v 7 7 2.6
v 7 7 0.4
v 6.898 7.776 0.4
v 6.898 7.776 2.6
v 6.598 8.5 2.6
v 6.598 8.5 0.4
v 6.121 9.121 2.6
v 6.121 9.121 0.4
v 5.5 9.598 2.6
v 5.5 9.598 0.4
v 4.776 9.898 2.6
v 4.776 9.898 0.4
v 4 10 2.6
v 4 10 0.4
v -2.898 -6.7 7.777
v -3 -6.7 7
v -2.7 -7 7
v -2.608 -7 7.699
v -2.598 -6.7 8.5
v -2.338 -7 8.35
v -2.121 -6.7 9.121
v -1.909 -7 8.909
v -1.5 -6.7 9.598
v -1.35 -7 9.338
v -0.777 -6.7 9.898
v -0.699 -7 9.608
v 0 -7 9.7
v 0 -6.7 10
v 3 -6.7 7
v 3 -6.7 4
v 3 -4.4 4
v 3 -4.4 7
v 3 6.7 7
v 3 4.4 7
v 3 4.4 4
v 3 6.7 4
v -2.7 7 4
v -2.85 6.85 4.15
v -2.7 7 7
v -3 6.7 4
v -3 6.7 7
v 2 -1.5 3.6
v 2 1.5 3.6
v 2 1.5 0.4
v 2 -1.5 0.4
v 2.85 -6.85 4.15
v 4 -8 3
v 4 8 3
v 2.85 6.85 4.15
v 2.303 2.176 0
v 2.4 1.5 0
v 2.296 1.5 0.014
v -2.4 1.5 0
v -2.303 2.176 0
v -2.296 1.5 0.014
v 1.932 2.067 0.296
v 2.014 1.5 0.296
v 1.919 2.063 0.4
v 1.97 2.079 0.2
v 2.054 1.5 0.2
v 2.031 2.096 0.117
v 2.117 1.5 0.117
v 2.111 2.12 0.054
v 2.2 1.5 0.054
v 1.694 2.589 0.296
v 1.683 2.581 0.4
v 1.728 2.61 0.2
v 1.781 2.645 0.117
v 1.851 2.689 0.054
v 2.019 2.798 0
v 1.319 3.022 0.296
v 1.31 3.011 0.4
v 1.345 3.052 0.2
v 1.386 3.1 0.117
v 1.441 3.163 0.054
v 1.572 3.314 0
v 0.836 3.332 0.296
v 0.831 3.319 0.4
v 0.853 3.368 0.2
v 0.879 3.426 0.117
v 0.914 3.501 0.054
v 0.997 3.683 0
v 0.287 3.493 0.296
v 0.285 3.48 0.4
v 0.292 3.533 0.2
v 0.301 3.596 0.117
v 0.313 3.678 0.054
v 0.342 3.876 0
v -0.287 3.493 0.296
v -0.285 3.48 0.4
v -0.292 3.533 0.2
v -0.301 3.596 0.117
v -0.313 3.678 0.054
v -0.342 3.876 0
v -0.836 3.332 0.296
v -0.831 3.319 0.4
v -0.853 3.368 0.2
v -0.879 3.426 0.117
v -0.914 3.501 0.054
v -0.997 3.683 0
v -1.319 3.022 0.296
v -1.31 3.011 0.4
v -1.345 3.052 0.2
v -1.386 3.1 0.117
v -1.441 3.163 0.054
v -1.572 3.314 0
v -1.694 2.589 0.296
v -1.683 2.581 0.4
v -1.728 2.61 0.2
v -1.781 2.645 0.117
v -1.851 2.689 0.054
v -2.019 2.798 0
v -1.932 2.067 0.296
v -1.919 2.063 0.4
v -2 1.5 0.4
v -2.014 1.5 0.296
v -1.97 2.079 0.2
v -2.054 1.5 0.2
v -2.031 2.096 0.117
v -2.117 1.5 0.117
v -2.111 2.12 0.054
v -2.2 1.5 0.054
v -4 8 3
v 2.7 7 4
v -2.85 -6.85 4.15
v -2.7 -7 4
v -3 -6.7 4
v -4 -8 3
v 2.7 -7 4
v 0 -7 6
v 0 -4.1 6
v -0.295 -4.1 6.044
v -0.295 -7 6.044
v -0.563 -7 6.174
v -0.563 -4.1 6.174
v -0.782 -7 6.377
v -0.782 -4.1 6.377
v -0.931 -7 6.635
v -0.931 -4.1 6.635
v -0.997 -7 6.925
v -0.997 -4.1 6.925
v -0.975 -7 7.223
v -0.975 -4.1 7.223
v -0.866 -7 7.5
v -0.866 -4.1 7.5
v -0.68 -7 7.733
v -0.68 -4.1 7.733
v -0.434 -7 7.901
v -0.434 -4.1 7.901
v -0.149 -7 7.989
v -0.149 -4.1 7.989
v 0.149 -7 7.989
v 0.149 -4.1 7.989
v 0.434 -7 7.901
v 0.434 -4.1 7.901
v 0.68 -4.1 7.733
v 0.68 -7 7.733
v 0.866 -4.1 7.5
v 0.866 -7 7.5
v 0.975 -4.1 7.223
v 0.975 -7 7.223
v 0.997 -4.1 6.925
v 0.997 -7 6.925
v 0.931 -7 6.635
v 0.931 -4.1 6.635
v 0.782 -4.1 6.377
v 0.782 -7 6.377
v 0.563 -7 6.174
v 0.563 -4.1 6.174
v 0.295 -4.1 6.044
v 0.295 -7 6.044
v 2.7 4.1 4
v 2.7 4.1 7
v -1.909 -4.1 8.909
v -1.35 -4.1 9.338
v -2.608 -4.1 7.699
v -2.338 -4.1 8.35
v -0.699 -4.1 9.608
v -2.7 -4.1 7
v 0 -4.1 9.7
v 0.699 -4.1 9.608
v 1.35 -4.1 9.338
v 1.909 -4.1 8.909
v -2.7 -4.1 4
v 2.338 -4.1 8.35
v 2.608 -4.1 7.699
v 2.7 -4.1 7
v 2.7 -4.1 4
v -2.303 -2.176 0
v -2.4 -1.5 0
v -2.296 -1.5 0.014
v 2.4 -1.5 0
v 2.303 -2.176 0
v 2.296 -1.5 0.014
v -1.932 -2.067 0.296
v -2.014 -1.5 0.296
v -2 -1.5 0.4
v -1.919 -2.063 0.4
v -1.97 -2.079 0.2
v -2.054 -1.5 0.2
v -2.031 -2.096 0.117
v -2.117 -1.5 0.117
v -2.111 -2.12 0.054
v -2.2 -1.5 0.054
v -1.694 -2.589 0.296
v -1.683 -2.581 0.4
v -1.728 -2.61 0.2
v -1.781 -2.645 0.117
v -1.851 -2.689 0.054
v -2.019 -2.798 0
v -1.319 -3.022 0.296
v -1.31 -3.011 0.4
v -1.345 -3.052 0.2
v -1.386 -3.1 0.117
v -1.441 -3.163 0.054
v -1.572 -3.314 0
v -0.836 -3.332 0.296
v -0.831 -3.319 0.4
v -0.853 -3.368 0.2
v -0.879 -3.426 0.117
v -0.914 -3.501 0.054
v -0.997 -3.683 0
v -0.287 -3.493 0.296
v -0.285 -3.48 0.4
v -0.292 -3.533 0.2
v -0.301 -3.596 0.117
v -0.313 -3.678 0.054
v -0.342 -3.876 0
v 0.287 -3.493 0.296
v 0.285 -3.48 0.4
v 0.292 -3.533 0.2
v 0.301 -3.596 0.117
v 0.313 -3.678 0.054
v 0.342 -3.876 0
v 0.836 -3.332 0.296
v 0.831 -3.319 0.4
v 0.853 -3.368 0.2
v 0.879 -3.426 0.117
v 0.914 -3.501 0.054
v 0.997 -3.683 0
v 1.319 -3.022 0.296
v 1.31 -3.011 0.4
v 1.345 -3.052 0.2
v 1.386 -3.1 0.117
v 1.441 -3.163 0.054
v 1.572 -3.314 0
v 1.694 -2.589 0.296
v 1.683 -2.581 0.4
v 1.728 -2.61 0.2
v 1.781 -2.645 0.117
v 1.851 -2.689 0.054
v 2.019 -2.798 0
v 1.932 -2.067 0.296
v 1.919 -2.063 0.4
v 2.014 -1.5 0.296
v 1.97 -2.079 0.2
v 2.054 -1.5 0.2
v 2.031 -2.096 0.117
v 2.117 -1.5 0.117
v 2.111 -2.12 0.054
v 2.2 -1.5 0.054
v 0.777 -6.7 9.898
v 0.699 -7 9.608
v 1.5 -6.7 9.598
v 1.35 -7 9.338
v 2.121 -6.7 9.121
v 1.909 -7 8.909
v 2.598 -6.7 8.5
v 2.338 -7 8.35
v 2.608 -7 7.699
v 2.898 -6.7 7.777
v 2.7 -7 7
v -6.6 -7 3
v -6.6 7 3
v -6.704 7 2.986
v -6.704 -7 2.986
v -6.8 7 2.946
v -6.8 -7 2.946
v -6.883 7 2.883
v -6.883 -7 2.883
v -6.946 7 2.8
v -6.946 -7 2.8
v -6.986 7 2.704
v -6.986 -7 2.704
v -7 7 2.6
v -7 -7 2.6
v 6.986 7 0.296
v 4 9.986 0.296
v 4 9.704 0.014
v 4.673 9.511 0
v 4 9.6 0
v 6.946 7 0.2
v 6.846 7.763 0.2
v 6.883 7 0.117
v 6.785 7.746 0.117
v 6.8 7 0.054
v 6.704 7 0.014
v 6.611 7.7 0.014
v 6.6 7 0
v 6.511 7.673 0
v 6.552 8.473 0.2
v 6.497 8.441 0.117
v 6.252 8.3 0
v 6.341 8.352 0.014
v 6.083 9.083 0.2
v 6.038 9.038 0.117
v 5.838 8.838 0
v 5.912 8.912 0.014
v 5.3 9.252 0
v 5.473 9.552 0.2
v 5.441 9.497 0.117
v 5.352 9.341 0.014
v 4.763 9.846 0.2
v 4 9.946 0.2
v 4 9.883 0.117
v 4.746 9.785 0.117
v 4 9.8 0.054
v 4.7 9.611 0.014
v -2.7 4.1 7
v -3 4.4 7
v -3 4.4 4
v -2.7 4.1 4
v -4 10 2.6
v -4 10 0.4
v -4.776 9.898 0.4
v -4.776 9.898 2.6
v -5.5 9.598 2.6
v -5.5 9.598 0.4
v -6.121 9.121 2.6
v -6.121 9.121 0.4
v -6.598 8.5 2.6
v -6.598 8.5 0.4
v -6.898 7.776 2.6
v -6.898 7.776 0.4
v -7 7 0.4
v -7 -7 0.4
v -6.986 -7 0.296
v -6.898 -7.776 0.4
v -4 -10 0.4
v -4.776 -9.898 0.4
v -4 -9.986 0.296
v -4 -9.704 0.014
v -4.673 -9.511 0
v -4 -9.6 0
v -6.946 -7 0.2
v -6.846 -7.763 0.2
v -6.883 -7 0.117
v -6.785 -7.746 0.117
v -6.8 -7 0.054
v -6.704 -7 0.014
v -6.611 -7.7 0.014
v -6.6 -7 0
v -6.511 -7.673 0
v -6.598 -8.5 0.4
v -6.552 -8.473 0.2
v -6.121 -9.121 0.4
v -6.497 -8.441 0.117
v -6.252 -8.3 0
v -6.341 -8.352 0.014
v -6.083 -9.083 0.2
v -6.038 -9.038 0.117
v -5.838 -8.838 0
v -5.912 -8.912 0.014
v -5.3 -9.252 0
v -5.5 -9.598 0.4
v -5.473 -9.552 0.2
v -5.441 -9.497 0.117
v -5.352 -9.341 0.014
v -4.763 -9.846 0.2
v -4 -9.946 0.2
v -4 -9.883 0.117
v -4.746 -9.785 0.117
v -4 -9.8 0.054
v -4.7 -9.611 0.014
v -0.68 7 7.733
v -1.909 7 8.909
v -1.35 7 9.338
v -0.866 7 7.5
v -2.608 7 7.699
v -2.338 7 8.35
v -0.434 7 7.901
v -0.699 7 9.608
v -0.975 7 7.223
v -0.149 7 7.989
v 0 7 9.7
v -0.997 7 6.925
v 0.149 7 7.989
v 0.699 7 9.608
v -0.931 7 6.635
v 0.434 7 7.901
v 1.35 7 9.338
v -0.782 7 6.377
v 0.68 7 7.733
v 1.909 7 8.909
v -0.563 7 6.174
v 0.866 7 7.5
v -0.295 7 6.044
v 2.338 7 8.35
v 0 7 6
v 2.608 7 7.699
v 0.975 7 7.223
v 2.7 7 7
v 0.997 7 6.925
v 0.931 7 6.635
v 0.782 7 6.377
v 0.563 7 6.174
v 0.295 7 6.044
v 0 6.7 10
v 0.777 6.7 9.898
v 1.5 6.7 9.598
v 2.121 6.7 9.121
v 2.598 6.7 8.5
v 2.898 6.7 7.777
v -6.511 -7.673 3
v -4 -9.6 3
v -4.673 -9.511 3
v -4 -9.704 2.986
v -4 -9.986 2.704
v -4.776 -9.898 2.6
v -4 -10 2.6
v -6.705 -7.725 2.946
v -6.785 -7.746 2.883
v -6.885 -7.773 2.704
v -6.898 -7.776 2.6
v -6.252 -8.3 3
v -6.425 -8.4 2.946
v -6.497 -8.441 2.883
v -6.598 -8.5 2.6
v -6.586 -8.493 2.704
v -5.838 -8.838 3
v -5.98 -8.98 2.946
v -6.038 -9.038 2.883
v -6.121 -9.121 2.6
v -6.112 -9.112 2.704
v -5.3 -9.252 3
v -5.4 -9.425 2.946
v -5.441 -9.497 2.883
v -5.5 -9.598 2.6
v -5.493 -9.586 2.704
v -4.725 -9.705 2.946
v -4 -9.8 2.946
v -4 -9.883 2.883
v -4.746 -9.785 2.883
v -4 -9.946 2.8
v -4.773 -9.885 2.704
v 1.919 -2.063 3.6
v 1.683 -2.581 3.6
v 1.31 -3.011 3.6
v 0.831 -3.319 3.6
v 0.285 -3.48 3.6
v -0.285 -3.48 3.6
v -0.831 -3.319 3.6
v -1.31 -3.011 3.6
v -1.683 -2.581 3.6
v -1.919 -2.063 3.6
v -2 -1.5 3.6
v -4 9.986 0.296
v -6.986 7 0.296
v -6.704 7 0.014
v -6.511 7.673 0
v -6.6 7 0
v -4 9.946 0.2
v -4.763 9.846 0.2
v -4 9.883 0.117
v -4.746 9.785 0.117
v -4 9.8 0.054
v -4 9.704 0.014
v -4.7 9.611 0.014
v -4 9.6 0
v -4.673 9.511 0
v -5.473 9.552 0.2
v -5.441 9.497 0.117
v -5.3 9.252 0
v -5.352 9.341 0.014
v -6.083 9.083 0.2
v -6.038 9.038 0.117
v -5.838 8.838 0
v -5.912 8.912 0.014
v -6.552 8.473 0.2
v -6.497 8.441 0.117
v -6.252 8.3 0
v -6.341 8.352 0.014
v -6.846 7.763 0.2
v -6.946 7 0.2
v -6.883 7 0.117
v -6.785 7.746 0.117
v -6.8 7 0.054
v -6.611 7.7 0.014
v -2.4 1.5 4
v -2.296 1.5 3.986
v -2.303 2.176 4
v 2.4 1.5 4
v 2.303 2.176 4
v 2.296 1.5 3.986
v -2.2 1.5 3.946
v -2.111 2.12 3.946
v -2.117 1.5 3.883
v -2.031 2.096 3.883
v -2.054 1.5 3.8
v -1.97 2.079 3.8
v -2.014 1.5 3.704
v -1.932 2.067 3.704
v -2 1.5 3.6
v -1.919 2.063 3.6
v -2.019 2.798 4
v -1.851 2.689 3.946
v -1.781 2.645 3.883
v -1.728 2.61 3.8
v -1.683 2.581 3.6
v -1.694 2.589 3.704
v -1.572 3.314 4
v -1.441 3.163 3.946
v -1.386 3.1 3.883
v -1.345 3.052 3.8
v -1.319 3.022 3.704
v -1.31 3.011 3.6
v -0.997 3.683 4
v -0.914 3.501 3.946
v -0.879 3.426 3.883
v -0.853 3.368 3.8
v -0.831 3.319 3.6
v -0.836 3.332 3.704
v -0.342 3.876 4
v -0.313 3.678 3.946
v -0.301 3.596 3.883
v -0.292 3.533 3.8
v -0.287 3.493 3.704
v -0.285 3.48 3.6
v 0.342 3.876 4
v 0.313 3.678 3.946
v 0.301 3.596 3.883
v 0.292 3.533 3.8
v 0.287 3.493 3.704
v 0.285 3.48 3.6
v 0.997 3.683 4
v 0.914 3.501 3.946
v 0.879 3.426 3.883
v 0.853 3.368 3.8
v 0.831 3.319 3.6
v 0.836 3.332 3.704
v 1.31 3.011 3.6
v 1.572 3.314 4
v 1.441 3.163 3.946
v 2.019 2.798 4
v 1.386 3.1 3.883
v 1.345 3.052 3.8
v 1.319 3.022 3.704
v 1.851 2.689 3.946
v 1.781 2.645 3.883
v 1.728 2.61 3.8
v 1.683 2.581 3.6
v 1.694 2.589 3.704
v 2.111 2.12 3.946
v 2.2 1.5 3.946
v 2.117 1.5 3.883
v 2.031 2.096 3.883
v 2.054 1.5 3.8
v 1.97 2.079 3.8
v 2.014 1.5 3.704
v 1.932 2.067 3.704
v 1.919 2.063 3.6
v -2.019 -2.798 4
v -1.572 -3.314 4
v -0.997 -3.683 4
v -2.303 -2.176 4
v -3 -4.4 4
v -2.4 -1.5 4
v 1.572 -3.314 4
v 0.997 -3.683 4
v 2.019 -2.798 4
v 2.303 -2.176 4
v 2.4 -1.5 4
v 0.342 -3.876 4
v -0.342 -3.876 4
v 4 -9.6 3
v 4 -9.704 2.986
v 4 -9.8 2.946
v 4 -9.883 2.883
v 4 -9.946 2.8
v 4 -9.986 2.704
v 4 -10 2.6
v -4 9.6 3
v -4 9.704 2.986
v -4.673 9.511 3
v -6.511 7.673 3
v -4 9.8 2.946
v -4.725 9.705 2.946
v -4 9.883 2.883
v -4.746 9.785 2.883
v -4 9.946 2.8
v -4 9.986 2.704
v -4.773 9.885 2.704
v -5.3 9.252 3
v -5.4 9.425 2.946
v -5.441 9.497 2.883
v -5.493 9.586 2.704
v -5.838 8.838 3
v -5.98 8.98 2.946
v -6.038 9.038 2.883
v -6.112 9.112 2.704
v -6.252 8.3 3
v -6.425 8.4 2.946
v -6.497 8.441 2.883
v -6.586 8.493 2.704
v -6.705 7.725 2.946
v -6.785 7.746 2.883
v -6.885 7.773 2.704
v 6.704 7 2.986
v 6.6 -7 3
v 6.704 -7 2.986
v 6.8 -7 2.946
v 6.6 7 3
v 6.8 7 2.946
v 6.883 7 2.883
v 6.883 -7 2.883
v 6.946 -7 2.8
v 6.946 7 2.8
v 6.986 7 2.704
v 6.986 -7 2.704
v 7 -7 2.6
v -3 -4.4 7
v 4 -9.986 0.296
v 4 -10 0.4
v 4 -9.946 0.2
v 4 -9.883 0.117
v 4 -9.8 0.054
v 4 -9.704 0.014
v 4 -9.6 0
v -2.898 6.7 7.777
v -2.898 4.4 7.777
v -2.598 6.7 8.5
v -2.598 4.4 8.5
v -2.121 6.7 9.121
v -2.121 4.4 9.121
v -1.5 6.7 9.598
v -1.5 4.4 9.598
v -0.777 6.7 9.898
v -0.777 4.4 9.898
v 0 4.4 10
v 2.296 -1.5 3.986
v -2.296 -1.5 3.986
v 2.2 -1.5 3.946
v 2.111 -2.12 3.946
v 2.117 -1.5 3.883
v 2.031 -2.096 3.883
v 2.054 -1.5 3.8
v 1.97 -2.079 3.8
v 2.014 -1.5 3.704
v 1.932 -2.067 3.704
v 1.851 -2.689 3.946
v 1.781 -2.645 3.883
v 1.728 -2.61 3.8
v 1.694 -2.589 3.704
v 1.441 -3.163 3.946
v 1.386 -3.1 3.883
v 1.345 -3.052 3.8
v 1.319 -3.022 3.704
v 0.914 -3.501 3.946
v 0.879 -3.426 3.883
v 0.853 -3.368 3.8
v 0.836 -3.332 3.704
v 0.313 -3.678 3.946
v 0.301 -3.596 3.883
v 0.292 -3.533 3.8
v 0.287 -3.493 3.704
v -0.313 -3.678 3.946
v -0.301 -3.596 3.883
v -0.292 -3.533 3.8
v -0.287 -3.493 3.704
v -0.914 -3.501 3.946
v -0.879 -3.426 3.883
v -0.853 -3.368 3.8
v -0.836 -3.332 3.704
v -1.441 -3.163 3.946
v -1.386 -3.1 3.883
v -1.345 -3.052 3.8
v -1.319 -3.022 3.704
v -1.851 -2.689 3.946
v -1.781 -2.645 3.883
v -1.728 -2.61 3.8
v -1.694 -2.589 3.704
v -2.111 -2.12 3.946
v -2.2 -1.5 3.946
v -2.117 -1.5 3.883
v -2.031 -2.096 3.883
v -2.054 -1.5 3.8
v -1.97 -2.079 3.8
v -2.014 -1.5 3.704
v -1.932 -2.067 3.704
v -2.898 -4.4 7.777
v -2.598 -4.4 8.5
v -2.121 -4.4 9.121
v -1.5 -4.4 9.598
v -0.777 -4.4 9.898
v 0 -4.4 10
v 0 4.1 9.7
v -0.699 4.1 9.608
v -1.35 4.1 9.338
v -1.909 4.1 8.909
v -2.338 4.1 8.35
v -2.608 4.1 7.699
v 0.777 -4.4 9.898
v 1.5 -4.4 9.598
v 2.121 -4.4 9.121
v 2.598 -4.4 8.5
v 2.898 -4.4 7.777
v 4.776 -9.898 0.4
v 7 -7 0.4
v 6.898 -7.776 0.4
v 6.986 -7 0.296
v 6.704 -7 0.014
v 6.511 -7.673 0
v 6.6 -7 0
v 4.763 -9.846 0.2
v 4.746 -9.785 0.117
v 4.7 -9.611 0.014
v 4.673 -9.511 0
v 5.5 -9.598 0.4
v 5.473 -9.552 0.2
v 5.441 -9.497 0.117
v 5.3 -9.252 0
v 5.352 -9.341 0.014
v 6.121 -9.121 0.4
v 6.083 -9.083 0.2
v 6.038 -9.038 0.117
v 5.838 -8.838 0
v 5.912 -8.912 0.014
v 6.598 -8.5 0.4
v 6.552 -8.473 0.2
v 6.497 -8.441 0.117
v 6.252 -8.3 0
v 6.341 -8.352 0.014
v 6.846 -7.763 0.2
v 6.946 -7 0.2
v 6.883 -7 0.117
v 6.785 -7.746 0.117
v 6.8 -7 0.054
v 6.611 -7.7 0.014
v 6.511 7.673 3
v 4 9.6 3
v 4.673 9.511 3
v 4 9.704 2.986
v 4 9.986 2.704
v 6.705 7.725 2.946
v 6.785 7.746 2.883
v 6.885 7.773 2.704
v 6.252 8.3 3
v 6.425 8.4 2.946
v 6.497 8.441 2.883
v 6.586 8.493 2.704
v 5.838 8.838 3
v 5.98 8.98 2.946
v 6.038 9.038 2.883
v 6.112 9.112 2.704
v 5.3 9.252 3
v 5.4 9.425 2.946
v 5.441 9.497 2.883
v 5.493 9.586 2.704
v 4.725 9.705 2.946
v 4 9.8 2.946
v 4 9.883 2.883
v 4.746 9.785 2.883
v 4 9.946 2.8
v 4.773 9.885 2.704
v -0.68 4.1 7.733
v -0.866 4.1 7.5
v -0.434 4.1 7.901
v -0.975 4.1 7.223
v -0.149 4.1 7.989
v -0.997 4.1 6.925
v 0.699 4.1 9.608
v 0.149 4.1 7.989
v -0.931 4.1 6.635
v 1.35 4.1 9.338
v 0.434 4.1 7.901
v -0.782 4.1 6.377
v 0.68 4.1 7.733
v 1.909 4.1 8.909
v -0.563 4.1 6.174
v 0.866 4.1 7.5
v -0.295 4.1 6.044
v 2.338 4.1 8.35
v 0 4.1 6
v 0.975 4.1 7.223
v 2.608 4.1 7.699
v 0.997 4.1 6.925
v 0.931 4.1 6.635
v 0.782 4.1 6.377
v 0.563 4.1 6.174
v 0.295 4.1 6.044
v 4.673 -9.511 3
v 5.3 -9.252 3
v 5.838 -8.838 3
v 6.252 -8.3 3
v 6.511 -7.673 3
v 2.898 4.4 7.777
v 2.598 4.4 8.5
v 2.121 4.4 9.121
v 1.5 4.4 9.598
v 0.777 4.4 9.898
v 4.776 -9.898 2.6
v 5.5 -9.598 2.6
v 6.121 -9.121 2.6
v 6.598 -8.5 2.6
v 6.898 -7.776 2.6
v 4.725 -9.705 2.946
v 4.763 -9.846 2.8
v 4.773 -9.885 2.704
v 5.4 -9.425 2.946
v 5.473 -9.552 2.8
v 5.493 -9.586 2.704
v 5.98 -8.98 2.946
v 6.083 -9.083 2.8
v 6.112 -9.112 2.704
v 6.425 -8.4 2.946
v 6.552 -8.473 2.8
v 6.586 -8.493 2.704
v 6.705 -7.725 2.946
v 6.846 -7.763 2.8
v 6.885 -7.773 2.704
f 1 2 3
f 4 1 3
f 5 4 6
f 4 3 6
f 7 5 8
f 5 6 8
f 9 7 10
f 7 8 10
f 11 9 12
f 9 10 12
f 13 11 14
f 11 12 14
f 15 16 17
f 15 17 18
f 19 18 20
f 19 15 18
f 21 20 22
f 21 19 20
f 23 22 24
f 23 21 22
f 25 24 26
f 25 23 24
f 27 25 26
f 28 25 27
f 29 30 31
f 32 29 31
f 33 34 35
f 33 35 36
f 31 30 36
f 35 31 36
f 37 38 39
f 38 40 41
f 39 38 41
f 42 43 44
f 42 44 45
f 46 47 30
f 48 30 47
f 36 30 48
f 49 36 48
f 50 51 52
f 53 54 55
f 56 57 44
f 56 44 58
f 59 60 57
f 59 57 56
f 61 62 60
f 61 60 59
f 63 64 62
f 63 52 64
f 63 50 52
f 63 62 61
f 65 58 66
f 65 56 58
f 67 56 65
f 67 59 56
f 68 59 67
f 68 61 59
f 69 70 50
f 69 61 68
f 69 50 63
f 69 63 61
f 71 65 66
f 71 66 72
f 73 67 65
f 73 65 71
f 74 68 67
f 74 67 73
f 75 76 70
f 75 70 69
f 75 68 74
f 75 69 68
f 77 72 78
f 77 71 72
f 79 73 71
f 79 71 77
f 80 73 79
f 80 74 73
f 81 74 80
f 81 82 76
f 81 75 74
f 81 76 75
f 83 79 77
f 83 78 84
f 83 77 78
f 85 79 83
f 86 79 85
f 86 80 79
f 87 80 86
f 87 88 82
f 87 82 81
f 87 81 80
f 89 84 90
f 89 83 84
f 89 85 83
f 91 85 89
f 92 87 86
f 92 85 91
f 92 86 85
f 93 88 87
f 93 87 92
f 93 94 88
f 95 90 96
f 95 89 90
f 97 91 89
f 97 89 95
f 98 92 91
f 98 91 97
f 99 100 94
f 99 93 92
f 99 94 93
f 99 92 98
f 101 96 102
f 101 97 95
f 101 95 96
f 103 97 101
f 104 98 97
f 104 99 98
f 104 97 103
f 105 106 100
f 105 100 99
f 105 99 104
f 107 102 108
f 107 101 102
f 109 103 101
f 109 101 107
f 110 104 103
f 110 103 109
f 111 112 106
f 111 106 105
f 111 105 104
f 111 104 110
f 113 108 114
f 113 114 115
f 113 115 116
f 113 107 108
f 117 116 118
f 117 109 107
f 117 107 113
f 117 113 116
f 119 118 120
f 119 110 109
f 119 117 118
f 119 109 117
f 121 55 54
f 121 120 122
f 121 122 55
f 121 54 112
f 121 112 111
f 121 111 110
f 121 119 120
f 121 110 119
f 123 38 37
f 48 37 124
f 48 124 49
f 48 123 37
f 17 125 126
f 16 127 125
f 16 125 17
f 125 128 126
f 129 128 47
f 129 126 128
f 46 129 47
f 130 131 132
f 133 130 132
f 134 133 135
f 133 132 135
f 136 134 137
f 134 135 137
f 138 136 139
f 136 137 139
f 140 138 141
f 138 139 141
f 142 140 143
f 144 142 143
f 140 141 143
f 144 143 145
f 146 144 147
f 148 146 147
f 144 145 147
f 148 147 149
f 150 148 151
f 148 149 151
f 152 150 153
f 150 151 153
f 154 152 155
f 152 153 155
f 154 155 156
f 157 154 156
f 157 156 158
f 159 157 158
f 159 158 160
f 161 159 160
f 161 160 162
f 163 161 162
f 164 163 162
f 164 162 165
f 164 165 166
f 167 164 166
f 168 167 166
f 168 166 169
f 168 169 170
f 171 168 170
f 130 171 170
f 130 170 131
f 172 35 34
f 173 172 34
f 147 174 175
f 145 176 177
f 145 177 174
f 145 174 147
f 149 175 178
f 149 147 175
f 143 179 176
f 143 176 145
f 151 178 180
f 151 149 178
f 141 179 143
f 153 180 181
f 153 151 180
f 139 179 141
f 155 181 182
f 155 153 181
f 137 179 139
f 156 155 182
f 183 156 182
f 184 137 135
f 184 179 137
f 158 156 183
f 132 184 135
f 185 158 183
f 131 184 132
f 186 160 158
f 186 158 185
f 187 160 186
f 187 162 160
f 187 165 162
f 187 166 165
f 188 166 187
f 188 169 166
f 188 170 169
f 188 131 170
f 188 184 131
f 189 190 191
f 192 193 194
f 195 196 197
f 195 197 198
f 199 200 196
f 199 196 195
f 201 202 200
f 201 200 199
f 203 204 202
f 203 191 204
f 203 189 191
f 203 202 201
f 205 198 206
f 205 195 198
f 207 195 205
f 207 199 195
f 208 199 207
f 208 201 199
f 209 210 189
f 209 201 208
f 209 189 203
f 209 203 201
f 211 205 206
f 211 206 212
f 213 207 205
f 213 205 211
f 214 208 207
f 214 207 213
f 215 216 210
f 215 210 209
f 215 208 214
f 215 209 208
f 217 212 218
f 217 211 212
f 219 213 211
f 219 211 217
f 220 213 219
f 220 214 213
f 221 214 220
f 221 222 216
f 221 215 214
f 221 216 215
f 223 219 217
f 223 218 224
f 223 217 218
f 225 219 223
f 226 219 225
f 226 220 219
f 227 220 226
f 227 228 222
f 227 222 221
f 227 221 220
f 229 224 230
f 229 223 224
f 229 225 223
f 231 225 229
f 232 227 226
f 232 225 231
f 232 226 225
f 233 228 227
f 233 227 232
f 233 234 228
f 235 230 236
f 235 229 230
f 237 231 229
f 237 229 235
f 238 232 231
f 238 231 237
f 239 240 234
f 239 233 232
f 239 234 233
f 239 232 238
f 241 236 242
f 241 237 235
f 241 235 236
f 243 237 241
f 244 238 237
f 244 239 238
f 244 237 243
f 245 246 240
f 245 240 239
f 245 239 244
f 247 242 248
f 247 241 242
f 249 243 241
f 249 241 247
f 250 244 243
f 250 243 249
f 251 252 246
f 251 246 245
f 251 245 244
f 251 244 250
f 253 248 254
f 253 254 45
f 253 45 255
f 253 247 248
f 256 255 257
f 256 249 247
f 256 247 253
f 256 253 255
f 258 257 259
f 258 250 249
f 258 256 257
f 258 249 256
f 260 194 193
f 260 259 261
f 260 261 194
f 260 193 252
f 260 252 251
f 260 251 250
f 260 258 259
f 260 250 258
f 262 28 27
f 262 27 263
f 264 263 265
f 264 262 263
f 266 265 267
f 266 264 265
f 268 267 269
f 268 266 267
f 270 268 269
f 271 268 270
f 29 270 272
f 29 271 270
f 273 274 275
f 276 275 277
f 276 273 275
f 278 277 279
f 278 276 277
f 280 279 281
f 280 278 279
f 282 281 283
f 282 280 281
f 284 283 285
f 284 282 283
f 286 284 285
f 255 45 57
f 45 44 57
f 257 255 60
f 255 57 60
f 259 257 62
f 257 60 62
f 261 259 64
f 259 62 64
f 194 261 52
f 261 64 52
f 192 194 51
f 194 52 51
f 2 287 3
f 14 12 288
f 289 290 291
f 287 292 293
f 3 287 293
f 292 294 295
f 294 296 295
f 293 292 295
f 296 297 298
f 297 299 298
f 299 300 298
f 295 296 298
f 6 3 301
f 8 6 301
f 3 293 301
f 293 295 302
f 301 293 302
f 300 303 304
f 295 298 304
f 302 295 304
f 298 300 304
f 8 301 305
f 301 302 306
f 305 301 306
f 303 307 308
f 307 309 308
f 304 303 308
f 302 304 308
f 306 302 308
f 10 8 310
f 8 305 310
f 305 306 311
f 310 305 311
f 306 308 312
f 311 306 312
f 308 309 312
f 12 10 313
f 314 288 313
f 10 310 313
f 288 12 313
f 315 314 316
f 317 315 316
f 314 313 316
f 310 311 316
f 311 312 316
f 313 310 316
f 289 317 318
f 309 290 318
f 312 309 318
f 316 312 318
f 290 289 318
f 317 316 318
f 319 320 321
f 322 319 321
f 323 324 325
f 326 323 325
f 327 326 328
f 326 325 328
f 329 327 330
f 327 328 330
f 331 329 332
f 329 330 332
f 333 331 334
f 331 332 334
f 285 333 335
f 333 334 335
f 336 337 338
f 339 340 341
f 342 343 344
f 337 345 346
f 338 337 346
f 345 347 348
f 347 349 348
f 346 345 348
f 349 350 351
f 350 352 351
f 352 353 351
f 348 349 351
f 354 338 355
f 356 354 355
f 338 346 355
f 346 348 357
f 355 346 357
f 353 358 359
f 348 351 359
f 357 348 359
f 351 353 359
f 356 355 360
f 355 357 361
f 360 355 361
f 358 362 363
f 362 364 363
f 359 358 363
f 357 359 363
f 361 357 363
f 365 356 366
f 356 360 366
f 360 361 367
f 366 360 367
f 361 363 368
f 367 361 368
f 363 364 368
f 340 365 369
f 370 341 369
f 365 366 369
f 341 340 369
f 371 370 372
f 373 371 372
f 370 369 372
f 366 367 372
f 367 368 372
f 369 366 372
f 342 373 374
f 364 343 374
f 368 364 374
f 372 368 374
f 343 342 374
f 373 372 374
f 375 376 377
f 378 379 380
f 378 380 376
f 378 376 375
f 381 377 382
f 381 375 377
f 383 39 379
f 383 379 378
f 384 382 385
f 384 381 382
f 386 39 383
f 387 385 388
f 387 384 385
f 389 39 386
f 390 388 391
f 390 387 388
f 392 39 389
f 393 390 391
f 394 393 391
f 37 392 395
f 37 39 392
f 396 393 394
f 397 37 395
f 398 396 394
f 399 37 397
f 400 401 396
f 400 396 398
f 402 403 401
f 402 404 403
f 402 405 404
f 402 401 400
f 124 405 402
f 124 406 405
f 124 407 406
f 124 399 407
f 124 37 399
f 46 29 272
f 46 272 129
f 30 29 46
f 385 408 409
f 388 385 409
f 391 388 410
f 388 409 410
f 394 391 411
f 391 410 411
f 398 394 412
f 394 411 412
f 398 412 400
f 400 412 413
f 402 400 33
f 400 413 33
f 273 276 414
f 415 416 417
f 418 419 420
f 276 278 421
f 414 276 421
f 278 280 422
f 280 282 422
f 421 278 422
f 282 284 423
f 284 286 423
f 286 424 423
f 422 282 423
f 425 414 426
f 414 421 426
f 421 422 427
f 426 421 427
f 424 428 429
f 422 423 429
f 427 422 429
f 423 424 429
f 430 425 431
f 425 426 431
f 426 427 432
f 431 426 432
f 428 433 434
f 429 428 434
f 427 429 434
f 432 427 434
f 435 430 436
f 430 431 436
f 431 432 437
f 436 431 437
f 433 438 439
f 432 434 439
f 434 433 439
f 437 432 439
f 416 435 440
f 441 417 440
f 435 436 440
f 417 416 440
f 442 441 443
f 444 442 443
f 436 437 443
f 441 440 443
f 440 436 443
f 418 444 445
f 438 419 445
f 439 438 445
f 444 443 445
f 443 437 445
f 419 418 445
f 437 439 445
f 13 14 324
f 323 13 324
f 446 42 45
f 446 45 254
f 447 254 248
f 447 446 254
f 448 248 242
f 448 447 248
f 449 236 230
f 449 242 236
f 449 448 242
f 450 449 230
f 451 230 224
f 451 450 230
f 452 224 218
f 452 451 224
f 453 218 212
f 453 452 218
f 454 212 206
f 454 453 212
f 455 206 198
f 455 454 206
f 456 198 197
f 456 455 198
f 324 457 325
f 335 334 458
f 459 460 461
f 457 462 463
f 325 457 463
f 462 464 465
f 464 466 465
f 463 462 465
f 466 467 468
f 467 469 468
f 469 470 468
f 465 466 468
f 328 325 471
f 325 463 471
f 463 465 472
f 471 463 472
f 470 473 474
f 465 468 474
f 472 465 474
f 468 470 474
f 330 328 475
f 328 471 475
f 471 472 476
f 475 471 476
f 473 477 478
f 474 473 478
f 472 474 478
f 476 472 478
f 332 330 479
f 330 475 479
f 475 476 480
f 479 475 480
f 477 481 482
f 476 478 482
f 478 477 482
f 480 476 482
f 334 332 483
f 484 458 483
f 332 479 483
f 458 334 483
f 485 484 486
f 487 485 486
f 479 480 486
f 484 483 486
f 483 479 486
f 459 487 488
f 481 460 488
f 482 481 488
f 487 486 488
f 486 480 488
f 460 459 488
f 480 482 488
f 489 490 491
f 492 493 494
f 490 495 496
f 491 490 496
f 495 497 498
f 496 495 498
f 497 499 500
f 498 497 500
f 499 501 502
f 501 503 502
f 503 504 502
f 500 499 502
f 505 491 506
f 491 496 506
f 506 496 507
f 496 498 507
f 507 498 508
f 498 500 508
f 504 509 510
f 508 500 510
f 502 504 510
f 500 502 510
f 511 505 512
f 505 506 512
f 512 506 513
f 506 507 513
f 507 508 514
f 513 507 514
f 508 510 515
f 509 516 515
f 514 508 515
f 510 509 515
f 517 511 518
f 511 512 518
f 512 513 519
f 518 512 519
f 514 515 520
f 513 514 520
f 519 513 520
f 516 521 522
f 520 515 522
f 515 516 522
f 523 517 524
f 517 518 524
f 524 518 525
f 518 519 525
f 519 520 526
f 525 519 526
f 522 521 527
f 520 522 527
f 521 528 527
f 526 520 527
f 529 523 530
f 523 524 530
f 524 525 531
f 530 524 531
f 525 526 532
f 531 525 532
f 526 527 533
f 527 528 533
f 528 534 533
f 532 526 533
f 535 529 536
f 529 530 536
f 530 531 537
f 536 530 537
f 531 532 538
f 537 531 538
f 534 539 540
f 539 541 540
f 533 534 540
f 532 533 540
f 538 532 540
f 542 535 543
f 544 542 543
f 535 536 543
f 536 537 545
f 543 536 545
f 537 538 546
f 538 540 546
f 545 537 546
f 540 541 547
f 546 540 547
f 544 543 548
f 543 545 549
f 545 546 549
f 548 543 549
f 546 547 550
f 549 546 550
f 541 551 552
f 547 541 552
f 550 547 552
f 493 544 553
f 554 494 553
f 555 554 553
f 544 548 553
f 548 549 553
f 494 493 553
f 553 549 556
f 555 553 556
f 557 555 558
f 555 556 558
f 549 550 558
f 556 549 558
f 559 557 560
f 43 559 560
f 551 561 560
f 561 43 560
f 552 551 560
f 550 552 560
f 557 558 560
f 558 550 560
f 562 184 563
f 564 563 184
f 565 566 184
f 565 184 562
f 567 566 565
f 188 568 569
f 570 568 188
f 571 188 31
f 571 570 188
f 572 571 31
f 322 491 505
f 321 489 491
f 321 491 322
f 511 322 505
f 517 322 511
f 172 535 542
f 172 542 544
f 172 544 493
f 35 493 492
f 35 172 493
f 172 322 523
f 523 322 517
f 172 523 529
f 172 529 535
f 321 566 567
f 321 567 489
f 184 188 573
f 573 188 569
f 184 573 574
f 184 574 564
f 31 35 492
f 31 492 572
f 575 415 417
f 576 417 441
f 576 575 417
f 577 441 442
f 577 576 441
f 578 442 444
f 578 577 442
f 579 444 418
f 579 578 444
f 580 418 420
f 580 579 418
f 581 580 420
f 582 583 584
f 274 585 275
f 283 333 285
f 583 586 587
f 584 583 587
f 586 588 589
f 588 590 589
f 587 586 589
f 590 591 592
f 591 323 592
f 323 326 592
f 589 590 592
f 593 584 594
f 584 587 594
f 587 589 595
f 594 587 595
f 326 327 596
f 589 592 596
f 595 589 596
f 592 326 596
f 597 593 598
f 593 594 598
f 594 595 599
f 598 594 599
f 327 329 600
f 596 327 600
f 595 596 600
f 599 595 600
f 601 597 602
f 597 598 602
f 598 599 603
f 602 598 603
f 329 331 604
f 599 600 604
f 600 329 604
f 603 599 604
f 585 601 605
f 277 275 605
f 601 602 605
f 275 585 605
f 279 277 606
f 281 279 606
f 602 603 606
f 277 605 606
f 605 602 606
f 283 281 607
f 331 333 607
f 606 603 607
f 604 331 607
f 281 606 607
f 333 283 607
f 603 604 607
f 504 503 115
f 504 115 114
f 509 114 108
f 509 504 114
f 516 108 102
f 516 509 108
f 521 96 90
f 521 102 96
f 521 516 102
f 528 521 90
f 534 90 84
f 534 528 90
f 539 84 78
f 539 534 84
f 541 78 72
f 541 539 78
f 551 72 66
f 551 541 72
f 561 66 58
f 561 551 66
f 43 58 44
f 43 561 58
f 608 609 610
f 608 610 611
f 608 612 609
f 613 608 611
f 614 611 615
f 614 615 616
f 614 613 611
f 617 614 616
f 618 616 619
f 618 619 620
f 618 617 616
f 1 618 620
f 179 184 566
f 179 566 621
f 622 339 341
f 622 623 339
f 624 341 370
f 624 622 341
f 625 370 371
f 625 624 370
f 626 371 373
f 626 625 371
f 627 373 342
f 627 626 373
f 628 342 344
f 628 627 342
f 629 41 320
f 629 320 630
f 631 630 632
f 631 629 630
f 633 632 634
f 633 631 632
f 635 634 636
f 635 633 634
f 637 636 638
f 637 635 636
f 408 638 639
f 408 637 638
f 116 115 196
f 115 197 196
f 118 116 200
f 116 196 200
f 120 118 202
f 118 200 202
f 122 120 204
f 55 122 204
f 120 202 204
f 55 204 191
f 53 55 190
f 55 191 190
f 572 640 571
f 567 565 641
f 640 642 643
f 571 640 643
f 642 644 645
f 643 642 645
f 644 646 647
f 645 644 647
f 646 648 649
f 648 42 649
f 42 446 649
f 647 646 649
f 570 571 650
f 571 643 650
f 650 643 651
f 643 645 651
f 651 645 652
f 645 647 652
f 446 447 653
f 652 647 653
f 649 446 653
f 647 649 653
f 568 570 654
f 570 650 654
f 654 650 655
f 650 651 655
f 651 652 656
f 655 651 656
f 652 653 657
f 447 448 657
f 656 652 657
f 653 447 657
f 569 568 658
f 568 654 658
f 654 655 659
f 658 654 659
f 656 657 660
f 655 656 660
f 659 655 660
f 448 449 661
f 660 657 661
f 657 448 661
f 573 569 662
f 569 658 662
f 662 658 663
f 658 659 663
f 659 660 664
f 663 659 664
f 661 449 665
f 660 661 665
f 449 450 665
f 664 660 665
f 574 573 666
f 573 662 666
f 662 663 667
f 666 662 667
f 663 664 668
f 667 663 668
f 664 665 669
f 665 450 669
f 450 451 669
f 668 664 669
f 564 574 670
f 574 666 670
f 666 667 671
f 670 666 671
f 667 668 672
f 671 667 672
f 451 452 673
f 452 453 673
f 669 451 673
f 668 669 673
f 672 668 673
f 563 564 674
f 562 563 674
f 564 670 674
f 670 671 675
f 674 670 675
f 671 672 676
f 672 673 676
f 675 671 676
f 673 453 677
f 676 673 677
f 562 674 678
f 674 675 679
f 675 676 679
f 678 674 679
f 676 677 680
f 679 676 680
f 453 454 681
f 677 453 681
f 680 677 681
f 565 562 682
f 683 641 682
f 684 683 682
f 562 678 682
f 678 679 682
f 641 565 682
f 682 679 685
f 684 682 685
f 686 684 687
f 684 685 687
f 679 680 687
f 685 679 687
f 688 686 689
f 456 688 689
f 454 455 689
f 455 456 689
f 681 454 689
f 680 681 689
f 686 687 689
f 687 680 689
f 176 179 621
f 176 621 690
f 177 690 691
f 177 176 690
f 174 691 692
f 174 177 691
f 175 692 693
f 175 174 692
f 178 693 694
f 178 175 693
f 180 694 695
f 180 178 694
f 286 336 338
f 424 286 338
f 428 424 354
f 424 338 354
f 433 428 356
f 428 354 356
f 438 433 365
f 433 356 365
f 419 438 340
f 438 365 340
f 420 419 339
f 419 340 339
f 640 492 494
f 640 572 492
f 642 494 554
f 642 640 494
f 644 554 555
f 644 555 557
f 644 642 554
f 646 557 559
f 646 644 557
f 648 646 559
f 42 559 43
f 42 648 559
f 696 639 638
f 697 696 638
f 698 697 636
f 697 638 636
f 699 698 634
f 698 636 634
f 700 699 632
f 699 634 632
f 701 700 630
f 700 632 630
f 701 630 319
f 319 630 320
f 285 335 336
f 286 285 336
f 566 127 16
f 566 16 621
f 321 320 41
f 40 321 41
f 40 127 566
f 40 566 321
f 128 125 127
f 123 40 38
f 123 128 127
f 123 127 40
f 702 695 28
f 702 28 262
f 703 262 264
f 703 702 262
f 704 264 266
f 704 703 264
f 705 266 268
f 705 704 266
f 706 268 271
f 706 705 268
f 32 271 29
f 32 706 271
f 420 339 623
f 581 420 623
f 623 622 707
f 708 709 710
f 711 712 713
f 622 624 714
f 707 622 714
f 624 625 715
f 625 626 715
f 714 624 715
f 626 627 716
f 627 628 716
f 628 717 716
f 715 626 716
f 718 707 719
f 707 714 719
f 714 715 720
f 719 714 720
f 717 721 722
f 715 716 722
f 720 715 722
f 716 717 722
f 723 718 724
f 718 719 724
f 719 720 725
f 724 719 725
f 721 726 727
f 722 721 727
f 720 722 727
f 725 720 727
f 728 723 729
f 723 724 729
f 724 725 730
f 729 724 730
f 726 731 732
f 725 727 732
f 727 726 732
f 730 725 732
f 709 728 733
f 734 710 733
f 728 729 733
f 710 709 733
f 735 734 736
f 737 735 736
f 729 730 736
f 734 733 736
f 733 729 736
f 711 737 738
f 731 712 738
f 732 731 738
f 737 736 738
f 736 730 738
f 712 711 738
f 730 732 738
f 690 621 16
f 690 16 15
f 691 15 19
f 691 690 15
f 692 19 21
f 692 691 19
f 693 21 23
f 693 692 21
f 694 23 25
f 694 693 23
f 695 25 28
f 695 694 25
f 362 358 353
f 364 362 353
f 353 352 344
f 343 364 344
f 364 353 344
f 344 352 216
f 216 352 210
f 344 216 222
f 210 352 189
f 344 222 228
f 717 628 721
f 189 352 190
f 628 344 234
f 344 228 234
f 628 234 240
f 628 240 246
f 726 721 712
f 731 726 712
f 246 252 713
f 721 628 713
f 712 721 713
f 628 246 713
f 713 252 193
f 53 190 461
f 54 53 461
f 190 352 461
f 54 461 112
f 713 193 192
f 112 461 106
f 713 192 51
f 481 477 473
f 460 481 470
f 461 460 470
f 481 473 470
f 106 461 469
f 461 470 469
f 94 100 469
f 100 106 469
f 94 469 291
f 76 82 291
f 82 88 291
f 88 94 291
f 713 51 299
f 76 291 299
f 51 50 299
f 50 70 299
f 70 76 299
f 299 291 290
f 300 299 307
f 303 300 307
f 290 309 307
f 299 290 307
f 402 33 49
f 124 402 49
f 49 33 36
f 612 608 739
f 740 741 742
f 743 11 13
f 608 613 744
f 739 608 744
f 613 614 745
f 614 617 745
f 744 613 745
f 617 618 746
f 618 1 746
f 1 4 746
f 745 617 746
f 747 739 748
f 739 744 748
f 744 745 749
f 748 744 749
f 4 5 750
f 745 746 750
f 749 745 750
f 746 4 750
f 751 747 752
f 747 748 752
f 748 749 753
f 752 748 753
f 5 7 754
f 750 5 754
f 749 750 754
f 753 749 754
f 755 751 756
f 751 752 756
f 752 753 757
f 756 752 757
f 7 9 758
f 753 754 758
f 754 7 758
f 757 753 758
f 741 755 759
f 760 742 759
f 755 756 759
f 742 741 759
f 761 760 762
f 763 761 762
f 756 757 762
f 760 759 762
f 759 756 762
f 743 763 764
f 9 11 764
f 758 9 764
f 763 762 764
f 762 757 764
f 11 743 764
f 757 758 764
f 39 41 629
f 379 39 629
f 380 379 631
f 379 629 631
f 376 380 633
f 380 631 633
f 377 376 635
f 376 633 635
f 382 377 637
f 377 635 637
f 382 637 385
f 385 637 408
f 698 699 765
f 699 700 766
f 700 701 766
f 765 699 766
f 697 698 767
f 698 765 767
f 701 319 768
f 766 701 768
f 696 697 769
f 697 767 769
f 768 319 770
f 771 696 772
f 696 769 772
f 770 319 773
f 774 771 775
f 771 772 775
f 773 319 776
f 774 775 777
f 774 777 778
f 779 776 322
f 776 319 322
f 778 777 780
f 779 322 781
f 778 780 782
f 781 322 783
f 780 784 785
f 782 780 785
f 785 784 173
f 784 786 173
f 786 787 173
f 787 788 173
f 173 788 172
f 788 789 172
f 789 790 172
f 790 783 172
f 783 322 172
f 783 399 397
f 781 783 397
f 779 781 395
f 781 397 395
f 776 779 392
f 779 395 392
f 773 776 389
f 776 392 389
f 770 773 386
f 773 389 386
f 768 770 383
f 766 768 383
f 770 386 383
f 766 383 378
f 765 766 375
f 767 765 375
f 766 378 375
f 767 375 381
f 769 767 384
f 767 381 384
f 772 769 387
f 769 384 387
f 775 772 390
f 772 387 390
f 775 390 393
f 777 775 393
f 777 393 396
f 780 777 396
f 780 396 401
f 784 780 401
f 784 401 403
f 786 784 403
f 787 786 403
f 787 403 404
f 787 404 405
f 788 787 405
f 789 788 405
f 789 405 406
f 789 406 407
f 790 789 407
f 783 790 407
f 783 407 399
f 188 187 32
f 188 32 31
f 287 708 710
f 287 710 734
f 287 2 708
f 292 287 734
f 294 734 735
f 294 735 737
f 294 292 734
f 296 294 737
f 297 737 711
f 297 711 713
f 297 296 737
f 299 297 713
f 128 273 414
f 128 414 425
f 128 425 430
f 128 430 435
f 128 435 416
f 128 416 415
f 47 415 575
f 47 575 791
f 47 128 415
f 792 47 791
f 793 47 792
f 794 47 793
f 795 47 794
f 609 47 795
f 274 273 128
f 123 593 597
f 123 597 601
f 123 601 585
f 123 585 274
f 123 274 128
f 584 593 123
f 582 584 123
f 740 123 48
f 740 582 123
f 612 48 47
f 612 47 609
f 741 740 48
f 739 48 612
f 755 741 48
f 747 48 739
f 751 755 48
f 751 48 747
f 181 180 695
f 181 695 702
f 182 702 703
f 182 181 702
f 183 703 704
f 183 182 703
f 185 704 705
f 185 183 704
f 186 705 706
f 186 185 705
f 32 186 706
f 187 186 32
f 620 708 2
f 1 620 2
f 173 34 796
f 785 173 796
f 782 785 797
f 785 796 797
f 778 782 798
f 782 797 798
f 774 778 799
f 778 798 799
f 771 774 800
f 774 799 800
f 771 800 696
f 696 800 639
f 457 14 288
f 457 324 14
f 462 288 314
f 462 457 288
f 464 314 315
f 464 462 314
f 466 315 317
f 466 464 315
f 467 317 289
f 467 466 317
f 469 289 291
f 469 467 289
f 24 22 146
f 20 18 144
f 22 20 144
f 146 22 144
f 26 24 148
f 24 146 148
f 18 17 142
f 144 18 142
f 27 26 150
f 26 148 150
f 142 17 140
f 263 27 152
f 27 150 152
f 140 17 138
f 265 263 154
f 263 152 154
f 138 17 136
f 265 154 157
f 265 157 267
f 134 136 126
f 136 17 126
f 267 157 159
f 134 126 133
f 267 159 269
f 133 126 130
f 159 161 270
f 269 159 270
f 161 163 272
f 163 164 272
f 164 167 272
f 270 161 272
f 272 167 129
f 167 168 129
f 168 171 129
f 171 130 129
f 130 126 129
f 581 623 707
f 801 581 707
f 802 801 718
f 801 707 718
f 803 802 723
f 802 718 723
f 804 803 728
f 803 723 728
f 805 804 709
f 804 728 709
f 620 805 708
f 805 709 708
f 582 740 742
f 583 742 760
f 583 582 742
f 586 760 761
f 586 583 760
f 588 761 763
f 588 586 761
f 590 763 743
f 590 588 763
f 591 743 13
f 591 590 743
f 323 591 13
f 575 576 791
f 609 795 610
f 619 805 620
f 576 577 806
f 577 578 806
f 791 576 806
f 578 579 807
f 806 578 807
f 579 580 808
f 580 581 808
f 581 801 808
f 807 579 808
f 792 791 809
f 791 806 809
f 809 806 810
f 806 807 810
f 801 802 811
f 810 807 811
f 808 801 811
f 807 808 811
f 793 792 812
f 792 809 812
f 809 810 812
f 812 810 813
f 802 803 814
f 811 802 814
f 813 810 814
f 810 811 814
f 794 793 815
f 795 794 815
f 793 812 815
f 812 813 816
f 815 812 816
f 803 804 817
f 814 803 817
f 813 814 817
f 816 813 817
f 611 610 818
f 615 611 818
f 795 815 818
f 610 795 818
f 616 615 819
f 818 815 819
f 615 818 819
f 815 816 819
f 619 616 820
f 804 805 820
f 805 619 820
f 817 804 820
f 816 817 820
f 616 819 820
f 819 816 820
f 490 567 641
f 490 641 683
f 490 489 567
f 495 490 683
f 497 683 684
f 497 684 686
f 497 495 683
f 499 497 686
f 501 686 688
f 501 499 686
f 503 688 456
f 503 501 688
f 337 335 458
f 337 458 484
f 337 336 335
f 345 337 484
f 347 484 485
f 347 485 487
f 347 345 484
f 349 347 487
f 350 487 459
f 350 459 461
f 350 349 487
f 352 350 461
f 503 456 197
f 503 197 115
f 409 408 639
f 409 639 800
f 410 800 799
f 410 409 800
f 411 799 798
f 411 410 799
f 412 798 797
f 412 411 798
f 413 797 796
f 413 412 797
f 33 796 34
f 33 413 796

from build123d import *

# Parameters (mm, degrees)
BOSS_EXTRUDE1_DEPTH = 3
SKETCH2_W           = 6
SKETCH2_H           = 14
BOSS_EXTRUDE2_DEPTH = 1
SKETCH3_W           = 6
SKETCH3_H           = 2.9
BOSS_EXTRUDE3_DEPTH = 6
SKETCH4_R           = 1
CUT_EXTRUDE1_DEPTH  = 21.928449536
FILLET1_R           = 3
CHAMFER1_SIZE       = 1
CHAMFER2_SIZE       = 0.3
CUT_EXTRUDE2_DEPTH  = 14.601470509
FILLET2_R           = 0.4


with BuildPart() as part:
    # Sketch1 → Boss-Extrude1 (new body)
    with BuildSketch(Plane.XY):
        with BuildLine():
            Line((-4, -10), (4, -10))
            ThreePointArc((4, -10), (6.121320344, -9.121320344), (7, -7))
            Line((7, -7), (7, 7))
            ThreePointArc((7, 7), (6.121320344, 9.121320344), (4, 10))
            Line((4, 10), (-4, 10))
            ThreePointArc((-4, 10), (-6.121320344, 9.121320344), (-7, 7))
            Line((-7, 7), (-7, -7))
            ThreePointArc((-7, -7), (-6.121320344, -9.121320344), (-4, -10))
        make_face()
    extrude(amount=BOSS_EXTRUDE1_DEPTH)

    # Sketch2 → Boss-Extrude2 (add)
    with BuildSketch(Plane.XY.offset(3)):
        Rectangle(SKETCH2_W, SKETCH2_H)
    extrude(amount=BOSS_EXTRUDE2_DEPTH)

    # Sketch3 → Boss-Extrude3 (add)
    with BuildSketch(Plane.XY.offset(4)):
        with Locations((0, 5.55)):
            Rectangle(SKETCH3_W, SKETCH3_H)
        with Locations((0, -5.55)):
            Rectangle(SKETCH3_W, SKETCH3_H)
    extrude(amount=BOSS_EXTRUDE3_DEPTH)

    # Sketch4 → Cut-Extrude1 (cut, through all)
    with BuildSketch(Plane(origin=(0, 7, 0), x_dir=(1, 0, 0), z_dir=(0, 1, 0))):
        with Locations(Location((0, -7, 0), (0, 0, 90))):
            Circle(SKETCH4_R)
    extrude(amount=-CUT_EXTRUDE1_DEPTH, mode=Mode.SUBTRACT)

    # Fillet1
    fillet1_edges = [part.edges().sort_by_distance(p)[0] for p in [
        (3, -5.55, 10),
        (-3, -5.55, 10),
        (-3, 5.55, 10),
        (3, 5.55, 10),
    ]]
    fillet(fillet1_edges, radius=FILLET1_R - 0.0001)  # a hair under: the kernel refuses the full size

    # Chamfer1
    chamfer1_edges = [part.edges().sort_by_distance(p)[0] for p in [
        (3, 0, 3),
        (0, 7, 3),
        (-3, 0, 3),
        (0, -7, 3),
    ]]
    chamfer(chamfer1_edges, length=CHAMFER1_SIZE - 0.0001)  # a hair under: the kernel refuses the full size

    # Chamfer2
    chamfer2_edges = [part.edges().sort_by_distance(p)[0] for p in [
        (-3, -4.1, 5.50005),
        (3, -4.1, 5.50005),
        (-2.121349633, -4.1, 9.121349633),
        (2.121349633, -4.1, 9.121349633),
        (3, 7, 5.5),
        (3, 4.1, 5.50005),
        (3, -7, 5.5),
        (-3, -7, 5.5),
        (-2.121349633, -7, 9.121349633),
        (2.121349633, -7, 9.121349633),
        (-3, 4.1, 5.50005),
        (-3, 7, 5.5),
        (2.121349633, 4.1, 9.121349633),
        (-2.121349633, 4.1, 9.121349633),
        (2.121349633, 7, 9.121349633),
        (-2.121349633, 7, 9.121349633),
    ]]
    chamfer(chamfer2_edges, length=CHAMFER2_SIZE)

    # Sketch5 → Cut-Extrude2 (cut, through all)
    with BuildSketch(Plane.XY.offset(4)):
        with BuildLine():
            Line((-2, -1.5), (-2, 1.5))
            ThreePointArc((-2, 1.5), (0, 3.5), (2, 1.5))
            Line((2, 1.5), (2, -1.5))
            ThreePointArc((2, -1.5), (0, -3.5), (-2, -1.5))
        make_face()
    extrude(amount=-CUT_EXTRUDE2_DEPTH, mode=Mode.SUBTRACT)

    # Fillet2
    fillet2_edges = [part.edges().sort_by_distance(p)[0] for p in [
        (6.121320344, -9.121320344, 0),
        (7, 0, 0),
        (6.121320344, 9.121320344, 0),
        (0, 10, 0),
        (7, 0, 3),
        (6.121320344, -9.121320344, 3),
        (0, -3.5, 0),
        (-2, 0, 0),
        (0, 3.5, 0),
        (2, 0, 0),
        (0, -3.5, 4),
        (2, 0, 4),
        (0, 3.5, 4),
        (-2, 0, 4),
        (0, -10, 3),
        (-6.121320344, -9.121320344, 3),
        (-7, 0, 3),
        (-6.121320344, 9.121320344, 3),
        (0, 10, 3),
        (-6.121320344, 9.121320344, 0),
        (6.121320344, 9.121320344, 3),
        (-7, 0, 0),
        (-6.121320344, -9.121320344, 0),
        (0, -10, 0),
    ]]
    fillet(fillet2_edges, radius=FILLET2_R)


solid = part.part
